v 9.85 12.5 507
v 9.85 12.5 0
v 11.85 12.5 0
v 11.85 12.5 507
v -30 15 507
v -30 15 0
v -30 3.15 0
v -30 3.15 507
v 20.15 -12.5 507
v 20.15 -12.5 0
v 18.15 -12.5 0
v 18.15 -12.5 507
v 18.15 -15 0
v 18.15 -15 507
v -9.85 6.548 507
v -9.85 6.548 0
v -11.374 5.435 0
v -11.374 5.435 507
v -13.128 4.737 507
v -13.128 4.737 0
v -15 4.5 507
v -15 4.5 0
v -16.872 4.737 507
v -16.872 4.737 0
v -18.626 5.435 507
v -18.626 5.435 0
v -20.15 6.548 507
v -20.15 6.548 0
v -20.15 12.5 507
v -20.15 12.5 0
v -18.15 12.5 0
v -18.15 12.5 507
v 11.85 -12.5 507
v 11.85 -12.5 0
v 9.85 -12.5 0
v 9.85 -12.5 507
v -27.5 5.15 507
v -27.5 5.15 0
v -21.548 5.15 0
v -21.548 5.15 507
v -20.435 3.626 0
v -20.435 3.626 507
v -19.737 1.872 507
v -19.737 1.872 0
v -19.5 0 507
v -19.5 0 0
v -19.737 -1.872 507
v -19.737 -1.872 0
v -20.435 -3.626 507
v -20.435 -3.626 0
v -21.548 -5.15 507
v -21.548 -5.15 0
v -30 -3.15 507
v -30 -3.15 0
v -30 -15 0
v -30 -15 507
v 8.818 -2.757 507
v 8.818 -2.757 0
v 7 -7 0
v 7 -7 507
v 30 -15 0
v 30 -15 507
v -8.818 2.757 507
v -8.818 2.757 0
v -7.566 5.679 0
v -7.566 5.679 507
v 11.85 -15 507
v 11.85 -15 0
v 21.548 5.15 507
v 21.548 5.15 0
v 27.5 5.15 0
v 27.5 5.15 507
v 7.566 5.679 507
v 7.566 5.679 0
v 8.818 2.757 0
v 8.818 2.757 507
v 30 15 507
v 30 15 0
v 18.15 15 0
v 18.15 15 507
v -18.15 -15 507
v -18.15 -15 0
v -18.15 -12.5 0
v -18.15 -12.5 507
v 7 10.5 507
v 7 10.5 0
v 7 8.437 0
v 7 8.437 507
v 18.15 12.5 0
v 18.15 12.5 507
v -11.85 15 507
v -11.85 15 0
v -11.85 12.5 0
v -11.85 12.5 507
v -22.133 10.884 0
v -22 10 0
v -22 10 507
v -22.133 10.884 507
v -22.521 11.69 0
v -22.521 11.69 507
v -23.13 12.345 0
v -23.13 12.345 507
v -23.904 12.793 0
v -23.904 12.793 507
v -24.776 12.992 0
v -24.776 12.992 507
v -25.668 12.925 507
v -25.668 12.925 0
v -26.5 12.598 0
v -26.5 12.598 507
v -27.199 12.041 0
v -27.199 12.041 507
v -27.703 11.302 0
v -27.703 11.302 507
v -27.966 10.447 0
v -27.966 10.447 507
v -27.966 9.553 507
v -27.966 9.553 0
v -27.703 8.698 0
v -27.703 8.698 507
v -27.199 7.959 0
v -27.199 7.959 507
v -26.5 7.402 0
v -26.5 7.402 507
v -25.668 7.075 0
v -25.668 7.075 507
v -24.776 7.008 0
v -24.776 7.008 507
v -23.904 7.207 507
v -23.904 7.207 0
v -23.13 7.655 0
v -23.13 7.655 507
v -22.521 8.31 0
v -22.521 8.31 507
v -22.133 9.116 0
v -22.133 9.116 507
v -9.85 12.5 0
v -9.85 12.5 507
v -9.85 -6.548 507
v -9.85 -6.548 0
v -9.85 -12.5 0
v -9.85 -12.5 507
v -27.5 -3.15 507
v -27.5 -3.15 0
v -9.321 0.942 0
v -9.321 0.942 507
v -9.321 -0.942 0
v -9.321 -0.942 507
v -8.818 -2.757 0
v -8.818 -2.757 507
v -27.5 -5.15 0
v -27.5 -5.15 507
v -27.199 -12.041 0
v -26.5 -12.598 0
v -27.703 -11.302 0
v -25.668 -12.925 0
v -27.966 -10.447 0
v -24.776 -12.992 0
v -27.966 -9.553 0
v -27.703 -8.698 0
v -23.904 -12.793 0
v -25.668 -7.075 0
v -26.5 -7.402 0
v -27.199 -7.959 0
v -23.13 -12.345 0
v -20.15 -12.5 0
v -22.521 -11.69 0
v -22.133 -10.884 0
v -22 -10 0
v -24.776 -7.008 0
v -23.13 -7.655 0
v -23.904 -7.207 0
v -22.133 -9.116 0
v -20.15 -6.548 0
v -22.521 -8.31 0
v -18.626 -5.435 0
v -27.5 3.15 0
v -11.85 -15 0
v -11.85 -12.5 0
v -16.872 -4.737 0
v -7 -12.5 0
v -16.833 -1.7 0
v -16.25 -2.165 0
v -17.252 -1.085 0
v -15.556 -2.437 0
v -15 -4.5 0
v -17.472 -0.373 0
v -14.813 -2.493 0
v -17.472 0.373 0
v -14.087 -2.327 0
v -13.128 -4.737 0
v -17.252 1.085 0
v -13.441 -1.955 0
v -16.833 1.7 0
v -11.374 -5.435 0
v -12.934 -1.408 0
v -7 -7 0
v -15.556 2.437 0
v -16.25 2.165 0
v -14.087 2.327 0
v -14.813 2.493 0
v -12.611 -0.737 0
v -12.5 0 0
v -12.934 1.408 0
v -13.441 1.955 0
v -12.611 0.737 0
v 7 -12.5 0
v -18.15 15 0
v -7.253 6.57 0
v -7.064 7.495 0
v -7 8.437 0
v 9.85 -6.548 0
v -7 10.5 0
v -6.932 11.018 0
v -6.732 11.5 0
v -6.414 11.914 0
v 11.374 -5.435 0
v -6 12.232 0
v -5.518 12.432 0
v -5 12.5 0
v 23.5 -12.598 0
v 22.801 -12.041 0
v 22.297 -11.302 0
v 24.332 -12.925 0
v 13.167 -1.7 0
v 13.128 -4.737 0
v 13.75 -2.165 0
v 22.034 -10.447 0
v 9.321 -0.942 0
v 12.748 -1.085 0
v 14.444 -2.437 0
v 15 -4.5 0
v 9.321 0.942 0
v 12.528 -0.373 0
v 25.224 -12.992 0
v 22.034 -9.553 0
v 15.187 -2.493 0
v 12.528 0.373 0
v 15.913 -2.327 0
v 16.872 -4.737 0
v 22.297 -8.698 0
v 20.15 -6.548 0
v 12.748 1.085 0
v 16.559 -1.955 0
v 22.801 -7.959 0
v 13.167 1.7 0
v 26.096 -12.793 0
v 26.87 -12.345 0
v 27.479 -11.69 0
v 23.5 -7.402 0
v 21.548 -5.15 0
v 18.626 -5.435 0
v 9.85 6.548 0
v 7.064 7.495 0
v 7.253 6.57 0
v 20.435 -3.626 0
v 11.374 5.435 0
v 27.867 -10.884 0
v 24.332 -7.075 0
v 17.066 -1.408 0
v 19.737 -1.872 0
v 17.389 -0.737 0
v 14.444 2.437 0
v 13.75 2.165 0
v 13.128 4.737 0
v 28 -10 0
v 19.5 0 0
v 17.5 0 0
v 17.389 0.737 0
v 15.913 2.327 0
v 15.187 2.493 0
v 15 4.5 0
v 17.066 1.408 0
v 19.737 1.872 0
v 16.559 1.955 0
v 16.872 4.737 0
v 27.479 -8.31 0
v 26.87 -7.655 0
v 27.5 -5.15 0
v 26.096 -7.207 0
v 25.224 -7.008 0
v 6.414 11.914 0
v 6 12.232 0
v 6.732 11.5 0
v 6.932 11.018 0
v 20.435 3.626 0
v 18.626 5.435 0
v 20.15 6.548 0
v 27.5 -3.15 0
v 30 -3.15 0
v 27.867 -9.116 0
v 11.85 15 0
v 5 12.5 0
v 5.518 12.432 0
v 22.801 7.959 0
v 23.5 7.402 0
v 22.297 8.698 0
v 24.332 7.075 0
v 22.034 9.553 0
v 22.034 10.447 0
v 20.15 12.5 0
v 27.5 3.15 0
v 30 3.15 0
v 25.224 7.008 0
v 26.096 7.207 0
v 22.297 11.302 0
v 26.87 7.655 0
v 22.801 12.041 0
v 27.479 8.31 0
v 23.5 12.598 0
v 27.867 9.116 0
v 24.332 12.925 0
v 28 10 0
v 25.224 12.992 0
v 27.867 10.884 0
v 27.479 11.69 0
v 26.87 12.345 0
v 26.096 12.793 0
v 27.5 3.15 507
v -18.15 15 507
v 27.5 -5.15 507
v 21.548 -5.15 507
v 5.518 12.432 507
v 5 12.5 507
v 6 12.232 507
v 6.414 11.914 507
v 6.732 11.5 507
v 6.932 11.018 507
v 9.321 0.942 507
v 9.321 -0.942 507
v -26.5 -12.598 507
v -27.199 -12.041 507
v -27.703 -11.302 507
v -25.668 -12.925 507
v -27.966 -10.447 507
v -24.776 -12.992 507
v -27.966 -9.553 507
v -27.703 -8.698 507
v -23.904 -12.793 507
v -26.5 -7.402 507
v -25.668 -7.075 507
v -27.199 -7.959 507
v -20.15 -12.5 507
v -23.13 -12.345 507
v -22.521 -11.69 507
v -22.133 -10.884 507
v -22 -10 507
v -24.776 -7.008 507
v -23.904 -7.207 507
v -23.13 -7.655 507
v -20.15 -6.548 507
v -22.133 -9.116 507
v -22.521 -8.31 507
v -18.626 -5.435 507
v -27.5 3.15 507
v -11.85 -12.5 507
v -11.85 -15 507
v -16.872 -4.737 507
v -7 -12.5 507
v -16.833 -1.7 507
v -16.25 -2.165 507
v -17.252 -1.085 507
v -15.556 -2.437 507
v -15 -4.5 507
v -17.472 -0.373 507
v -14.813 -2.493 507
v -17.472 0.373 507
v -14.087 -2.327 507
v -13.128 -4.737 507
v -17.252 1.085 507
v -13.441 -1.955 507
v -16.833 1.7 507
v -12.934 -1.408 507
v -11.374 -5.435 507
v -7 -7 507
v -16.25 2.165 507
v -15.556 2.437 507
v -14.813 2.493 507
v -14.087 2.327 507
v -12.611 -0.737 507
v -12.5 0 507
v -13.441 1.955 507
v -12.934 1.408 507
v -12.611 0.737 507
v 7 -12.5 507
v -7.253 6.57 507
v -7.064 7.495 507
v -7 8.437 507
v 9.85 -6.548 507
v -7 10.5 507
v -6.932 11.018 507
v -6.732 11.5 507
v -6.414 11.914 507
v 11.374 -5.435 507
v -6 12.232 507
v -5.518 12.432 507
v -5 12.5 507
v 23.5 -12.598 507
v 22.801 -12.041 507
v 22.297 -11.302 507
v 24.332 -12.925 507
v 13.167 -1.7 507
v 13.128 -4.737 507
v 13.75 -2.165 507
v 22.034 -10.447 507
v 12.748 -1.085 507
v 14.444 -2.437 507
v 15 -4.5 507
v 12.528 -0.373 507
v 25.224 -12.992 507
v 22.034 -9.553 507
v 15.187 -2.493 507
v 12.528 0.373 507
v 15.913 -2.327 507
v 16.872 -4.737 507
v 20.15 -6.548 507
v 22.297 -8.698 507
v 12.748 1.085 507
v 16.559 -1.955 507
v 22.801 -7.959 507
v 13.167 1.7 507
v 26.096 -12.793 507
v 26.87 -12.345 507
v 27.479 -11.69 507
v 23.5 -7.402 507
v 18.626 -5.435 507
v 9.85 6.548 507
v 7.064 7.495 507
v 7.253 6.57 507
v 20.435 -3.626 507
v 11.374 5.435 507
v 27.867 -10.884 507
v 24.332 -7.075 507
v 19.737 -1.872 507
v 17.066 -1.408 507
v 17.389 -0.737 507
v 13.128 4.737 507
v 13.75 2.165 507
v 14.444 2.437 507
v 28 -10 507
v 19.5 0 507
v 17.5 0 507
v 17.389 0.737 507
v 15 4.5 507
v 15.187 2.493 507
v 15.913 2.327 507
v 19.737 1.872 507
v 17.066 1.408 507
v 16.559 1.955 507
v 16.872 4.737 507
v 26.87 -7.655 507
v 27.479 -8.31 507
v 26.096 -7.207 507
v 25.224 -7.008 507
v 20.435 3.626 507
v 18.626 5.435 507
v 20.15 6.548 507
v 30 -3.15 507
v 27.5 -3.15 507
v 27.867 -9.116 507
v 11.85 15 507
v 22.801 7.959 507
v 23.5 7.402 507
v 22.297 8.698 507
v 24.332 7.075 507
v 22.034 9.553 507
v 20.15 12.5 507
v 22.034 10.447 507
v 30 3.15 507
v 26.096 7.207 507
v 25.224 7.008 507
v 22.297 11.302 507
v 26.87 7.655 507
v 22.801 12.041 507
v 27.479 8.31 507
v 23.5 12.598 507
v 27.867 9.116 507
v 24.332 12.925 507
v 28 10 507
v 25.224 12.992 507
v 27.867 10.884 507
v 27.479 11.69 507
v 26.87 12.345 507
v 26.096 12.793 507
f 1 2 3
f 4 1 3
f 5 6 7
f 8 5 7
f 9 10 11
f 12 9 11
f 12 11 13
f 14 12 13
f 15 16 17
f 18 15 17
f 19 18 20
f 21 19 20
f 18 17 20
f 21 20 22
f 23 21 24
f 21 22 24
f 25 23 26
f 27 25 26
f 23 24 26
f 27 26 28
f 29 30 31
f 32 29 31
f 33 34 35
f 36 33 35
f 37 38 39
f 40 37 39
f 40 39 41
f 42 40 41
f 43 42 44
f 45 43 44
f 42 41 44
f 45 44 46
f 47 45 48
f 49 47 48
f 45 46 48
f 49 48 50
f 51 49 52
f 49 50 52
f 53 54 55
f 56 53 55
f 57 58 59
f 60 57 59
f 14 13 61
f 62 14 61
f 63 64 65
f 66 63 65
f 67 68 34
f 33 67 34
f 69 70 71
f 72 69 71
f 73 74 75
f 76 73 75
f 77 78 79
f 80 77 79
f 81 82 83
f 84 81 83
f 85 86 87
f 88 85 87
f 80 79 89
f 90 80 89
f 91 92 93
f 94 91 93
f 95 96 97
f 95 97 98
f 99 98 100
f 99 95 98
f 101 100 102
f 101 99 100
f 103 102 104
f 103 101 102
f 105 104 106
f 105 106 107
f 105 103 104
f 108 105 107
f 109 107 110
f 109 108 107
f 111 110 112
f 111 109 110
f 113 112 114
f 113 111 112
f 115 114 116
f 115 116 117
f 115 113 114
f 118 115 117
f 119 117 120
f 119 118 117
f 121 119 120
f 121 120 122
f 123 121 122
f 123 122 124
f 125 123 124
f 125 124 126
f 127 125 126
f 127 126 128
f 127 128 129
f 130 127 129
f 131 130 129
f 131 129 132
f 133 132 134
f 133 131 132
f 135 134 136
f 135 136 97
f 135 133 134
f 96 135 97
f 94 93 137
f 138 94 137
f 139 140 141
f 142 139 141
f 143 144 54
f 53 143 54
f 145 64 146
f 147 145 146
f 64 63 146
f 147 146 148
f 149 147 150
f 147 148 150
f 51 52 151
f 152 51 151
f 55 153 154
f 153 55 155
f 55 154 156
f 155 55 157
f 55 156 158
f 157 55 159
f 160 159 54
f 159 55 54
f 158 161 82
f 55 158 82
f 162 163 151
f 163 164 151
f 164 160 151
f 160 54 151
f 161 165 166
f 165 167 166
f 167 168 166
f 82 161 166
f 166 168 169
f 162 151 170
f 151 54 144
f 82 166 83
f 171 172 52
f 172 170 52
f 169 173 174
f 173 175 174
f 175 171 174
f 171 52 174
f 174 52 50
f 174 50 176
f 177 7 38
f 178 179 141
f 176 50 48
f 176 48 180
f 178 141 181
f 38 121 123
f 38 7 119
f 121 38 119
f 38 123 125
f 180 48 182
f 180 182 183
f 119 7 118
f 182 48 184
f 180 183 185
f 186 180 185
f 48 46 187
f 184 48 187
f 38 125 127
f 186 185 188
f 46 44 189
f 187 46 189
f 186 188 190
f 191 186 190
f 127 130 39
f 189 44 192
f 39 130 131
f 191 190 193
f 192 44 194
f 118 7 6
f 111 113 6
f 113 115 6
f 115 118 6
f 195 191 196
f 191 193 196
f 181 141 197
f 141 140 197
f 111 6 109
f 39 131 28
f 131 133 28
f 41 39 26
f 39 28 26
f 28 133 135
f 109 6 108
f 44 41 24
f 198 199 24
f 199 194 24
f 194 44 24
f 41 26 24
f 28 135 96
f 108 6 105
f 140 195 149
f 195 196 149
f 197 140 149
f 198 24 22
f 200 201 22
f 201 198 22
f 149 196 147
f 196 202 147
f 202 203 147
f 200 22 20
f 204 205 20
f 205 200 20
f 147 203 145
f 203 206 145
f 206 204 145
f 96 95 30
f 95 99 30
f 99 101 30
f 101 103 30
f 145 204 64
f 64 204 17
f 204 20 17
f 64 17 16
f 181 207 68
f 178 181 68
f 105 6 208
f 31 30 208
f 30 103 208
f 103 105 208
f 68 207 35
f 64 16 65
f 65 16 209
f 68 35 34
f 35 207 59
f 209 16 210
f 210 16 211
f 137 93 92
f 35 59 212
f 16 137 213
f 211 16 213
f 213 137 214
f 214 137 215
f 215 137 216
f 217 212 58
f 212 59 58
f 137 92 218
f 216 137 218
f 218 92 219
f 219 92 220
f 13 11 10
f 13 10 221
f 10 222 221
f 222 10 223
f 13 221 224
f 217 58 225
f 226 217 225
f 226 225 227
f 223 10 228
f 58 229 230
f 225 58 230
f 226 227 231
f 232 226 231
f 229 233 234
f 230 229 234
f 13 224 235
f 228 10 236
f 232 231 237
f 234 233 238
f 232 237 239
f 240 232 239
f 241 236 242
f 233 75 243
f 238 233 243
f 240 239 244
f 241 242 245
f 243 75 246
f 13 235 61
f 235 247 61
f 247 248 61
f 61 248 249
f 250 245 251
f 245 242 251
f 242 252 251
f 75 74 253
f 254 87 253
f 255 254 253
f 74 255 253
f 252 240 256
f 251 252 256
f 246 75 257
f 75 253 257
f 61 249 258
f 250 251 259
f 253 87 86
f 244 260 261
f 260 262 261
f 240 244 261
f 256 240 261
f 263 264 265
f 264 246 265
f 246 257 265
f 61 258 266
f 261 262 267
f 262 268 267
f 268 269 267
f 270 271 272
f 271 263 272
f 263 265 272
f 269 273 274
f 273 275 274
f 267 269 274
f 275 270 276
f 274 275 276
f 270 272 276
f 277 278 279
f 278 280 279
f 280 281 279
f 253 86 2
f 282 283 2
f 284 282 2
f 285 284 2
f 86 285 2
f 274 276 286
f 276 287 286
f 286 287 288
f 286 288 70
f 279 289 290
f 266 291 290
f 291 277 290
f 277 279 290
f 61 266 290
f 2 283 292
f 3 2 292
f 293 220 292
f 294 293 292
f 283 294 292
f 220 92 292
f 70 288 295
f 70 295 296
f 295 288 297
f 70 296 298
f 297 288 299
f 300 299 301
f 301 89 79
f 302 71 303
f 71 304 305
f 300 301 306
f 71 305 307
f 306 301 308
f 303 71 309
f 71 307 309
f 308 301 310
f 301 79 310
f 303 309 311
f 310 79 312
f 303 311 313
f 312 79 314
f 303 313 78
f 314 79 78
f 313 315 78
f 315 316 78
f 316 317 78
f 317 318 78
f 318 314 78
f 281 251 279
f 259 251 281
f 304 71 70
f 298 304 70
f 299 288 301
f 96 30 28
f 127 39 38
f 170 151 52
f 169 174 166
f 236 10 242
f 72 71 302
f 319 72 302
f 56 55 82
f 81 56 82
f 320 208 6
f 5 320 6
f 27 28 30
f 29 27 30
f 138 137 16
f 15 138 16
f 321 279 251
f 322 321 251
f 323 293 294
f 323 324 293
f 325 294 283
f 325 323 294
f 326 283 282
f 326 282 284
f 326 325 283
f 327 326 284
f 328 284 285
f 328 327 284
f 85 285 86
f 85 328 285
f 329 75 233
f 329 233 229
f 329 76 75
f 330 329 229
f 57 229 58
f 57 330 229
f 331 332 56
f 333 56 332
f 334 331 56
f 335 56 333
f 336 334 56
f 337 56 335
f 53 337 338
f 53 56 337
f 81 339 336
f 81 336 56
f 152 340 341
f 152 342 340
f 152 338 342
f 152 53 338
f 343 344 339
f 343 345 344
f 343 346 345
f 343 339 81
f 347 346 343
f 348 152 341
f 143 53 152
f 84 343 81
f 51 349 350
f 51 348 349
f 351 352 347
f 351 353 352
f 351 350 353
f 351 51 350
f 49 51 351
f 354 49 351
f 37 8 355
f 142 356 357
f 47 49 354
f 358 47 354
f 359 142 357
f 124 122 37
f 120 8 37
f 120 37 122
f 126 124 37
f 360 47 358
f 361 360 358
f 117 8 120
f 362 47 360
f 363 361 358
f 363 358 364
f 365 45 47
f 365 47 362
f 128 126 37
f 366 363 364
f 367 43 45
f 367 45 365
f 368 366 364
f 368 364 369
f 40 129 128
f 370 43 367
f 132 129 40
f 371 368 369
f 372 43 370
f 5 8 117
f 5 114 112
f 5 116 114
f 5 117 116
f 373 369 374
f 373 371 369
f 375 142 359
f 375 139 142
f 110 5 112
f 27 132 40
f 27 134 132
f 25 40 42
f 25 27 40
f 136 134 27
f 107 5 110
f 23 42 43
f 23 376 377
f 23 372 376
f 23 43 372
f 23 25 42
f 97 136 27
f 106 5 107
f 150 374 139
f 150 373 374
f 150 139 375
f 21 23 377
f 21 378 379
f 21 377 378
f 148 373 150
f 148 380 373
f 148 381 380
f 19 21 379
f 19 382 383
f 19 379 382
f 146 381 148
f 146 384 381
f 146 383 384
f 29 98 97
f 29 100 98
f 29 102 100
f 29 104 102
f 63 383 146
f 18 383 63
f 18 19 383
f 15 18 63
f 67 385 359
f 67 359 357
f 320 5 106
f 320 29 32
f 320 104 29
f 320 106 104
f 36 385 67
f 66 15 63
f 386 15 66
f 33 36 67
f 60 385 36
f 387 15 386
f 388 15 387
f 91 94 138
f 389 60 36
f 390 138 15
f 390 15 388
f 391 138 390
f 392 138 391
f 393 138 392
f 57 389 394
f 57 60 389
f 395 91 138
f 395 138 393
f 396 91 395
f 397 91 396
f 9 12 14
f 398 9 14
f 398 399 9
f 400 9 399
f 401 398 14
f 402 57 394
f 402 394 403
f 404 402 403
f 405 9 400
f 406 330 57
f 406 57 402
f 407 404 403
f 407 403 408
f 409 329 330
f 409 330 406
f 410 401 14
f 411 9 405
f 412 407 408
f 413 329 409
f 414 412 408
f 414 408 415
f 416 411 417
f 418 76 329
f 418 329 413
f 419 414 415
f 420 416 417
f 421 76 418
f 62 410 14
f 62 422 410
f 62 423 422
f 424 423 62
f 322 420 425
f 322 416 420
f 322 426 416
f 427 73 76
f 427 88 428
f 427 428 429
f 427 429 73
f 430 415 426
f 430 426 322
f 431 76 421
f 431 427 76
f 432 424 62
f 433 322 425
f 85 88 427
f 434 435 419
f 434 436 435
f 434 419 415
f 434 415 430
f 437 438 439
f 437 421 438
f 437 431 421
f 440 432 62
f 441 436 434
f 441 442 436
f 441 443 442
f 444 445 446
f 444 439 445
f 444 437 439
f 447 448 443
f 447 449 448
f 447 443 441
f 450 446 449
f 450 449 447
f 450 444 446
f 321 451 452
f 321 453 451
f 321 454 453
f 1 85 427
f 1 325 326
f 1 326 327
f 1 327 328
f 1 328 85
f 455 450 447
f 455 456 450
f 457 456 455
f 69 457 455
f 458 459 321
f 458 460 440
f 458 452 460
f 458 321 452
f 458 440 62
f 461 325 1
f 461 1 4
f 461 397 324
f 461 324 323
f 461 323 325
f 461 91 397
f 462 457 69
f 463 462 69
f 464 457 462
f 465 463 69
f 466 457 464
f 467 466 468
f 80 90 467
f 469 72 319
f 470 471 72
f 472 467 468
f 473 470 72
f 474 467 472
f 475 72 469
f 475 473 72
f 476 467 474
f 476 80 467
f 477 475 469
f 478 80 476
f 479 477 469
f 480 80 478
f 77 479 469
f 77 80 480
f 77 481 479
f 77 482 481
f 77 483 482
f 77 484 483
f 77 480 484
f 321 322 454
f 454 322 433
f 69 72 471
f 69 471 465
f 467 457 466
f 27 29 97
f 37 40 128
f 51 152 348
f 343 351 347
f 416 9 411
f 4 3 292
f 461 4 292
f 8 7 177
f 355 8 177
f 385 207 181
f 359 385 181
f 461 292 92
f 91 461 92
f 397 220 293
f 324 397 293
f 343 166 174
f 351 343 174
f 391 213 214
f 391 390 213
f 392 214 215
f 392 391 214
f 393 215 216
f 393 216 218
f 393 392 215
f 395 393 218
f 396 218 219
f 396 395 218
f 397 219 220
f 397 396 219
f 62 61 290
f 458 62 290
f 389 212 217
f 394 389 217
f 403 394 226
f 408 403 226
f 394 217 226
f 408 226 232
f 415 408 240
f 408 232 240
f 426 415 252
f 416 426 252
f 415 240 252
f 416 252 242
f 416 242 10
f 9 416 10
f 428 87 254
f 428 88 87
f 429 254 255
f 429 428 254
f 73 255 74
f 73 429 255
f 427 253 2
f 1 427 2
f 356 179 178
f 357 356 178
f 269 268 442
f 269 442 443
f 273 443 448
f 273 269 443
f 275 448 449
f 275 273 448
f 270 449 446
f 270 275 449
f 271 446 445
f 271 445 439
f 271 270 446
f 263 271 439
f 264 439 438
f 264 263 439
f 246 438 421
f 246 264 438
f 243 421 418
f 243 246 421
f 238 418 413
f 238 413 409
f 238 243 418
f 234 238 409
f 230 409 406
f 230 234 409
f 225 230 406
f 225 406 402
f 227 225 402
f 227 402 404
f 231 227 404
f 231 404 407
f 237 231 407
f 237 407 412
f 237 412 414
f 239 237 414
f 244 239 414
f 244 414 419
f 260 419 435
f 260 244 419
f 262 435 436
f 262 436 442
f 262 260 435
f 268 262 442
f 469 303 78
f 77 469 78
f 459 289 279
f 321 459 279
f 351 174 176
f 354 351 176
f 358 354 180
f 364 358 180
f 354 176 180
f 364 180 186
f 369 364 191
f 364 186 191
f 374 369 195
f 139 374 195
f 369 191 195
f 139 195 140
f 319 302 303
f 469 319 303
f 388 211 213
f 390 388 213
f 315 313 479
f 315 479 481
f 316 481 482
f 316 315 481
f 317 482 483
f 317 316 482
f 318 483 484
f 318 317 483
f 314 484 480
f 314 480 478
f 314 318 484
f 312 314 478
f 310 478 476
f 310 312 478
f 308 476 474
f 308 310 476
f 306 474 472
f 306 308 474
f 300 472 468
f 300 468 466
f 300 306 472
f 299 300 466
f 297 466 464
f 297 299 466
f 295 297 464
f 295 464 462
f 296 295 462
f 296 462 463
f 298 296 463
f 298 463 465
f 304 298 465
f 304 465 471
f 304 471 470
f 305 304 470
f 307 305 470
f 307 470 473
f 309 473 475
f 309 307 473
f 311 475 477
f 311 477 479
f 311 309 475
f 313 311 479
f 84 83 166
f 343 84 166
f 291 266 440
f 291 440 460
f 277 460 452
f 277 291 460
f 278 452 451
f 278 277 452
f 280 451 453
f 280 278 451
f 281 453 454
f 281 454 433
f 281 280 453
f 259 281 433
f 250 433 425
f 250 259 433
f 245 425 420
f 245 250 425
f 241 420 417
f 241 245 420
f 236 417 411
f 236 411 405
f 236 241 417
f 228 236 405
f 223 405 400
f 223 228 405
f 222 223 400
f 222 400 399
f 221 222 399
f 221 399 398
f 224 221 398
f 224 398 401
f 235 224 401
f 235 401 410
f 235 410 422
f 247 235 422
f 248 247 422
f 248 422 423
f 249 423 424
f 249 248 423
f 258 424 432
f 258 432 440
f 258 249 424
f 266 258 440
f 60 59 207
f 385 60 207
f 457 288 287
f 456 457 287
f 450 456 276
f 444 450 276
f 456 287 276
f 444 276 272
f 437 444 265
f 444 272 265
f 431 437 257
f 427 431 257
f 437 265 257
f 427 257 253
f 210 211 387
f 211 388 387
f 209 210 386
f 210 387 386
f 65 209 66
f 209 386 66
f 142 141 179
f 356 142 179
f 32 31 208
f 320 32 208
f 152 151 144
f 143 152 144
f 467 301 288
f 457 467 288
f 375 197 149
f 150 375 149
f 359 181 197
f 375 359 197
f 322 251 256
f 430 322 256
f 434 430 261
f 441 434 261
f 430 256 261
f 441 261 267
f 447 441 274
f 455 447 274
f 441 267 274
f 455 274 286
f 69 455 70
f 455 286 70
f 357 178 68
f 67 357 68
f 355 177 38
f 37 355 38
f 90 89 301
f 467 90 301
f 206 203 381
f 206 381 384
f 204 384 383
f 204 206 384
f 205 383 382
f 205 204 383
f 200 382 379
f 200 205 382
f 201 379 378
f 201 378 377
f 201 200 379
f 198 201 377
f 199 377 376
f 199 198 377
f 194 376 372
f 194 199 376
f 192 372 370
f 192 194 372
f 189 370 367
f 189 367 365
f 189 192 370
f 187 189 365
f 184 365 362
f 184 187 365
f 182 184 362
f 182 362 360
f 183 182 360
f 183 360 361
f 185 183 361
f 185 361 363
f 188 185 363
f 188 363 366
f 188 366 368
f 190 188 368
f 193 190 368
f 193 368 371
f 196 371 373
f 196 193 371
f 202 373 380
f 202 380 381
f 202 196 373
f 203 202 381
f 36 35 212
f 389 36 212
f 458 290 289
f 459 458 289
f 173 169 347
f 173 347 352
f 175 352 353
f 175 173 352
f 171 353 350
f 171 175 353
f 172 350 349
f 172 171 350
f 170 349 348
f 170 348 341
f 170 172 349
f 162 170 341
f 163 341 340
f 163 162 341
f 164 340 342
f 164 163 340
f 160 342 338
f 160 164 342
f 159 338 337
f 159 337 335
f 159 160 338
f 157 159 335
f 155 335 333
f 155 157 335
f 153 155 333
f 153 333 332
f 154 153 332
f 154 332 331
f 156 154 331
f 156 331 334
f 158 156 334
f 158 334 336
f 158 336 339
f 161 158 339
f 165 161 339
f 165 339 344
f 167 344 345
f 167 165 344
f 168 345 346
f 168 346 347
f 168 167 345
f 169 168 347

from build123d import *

# Parameters (mm, degrees)
F0_R     = 3
F0_R_2   = 2.5
F1_DEPTH = 507
F2_R     = 2
F3_R     = 7


# Not quite as in the source:
# - a feature names something its author has since deleted; it is built from what else it names


with BuildPart() as f1:
    # F0 (on Top) → F1 (new body)
    with BuildSketch(Plane.XY):
        with BuildLine():
            Line((18.15, -15), (30, -15))
            Line((30, -15), (30, -3.15))
            Line((30, -3.15), (27.5, -3.15))
            Line((27.5, -3.15), (27.5, -5.15))
            Line((27.5, -5.15), (21.5477069044, -5.15))
            ThreePointArc((21.5477069044, -5.15), (19.5, 0), (21.5477069044, 5.15))
            Line((21.5477069044, 5.15), (27.5, 5.15))
            Line((27.5, 5.15), (27.5, 3.15))
            Line((27.5, 3.15), (30, 3.15))
            Line((30, 3.15), (30, 15))
            Line((30, 15), (18.15, 15))
            Line((18.15, 15), (18.15, 12.5))
            Line((18.15, 12.5), (20.15, 12.5))
            Line((20.15, 12.5), (20.15, 6.5477069044))
            ThreePointArc((20.15, 6.5477069044), (15, 4.5), (9.85, 6.5477069044))
            Line((9.85, 6.5477069044), (9.85, 12.5))
            Line((9.85, 12.5), (11.85, 12.5))
            Line((11.85, 12.5), (11.85, 15))
            Line((11.85, 15), (-11.85, 15))
            Line((-11.85, 15), (-11.85, 12.5))
            Line((-11.85, 12.5), (-9.85, 12.5))
            Line((-9.85, 12.5), (-9.85, 6.5477069044))
            ThreePointArc((-9.85, 6.5477069044), (-15, 4.5), (-20.15, 6.5477069044))
            Line((-20.15, 6.5477069044), (-20.15, 12.5))
            Line((-20.15, 12.5), (-18.15, 12.5))
            Line((-18.15, 12.5), (-18.15, 15))
            Line((-18.15, 15), (-30, 15))
            Line((-30, 15), (-30, 3.15))
            Line((-30, 3.15), (-27.5, 3.15))
            Line((-27.5, 3.15), (-27.5, 5.15))
            Line((-27.5, 5.15), (-21.5477069044, 5.15))
            ThreePointArc((-21.5477069044, 5.15), (-19.5, 0), (-21.5477069044, -5.15))
            Line((-21.5477069044, -5.15), (-27.5, -5.15))
            Line((-27.5, -5.15), (-27.5, -3.15))
            Line((-27.5, -3.15), (-30, -3.15))
            Line((-30, -3.15), (-30, -15))
            Line((-30, -15), (-18.15, -15))
            Line((-18.15, -15), (-18.15, -12.5))
            Line((-18.15, -12.5), (-20.15, -12.5))
            Line((-20.15, -12.5), (-20.15, -6.5477069044))
            ThreePointArc((-20.15, -6.5477069044), (-15, -4.5), (-9.85, -6.5477069044))
            Line((-9.85, -6.5477069044), (-9.85, -12.5))
            Line((-9.85, -12.5), (-11.85, -12.5))
            Line((-11.85, -12.5), (-11.85, -15))
            Line((-11.85, -15), (11.85, -15))
            Line((11.85, -15), (11.85, -12.5))
            Line((11.85, -12.5), (9.85, -12.5))
            Line((9.85, -12.5), (9.85, -6.5477069044))
            ThreePointArc((9.85, -6.5477069044), (15, -4.5), (20.15, -6.5477069044))
            Line((20.15, -6.5477069044), (20.15, -12.5))
            Line((20.15, -12.5), (18.15, -12.5))
            Line((18.15, -12.5), (18.15, -15))
        make_face()
        with Locations((-25, -10)):
            Circle(F0_R, mode=Mode.SUBTRACT)
        with Locations((25, -10)):
            Circle(F0_R, mode=Mode.SUBTRACT)
        with Locations((-15, 0)):
            Circle(F0_R_2, mode=Mode.SUBTRACT)
        with Locations((-25, 10)):
            Circle(F0_R, mode=Mode.SUBTRACT)
        Polygon((-7, 7), (-7, 12.5), (0, 12.5), (7, 12.5), (7, 7), (10, 0), (7, -7), (7, -12.5), (0, -12.5), (-7, -12.5), (-7, -7), (-10, 0), align=None, mode=Mode.SUBTRACT)
        with Locations((15, 0)):
            Circle(F0_R_2, mode=Mode.SUBTRACT)
        with Locations((25, 10)):
            Circle(F0_R, mode=Mode.SUBTRACT)
    extrude(amount=F1_DEPTH)

    # F2
    f2_edges = [f1.edges().sort_by_distance(p)[0] for p in [
        (-7, 12.5, 253.5),
        (7, 12.5, 253.5),
    ]]
    fillet(f2_edges, radius=F2_R)

    # F3
    f3_edges = [f1.edges().sort_by_distance(p)[0] for p in [
        (-7, 7, 253.5),
        (-10, 0, 253.5),
        (7, 7, 253.5),
        (10, 0, 253.5),
    ]]
    fillet(f3_edges, radius=F3_R)


solid = f1.part
